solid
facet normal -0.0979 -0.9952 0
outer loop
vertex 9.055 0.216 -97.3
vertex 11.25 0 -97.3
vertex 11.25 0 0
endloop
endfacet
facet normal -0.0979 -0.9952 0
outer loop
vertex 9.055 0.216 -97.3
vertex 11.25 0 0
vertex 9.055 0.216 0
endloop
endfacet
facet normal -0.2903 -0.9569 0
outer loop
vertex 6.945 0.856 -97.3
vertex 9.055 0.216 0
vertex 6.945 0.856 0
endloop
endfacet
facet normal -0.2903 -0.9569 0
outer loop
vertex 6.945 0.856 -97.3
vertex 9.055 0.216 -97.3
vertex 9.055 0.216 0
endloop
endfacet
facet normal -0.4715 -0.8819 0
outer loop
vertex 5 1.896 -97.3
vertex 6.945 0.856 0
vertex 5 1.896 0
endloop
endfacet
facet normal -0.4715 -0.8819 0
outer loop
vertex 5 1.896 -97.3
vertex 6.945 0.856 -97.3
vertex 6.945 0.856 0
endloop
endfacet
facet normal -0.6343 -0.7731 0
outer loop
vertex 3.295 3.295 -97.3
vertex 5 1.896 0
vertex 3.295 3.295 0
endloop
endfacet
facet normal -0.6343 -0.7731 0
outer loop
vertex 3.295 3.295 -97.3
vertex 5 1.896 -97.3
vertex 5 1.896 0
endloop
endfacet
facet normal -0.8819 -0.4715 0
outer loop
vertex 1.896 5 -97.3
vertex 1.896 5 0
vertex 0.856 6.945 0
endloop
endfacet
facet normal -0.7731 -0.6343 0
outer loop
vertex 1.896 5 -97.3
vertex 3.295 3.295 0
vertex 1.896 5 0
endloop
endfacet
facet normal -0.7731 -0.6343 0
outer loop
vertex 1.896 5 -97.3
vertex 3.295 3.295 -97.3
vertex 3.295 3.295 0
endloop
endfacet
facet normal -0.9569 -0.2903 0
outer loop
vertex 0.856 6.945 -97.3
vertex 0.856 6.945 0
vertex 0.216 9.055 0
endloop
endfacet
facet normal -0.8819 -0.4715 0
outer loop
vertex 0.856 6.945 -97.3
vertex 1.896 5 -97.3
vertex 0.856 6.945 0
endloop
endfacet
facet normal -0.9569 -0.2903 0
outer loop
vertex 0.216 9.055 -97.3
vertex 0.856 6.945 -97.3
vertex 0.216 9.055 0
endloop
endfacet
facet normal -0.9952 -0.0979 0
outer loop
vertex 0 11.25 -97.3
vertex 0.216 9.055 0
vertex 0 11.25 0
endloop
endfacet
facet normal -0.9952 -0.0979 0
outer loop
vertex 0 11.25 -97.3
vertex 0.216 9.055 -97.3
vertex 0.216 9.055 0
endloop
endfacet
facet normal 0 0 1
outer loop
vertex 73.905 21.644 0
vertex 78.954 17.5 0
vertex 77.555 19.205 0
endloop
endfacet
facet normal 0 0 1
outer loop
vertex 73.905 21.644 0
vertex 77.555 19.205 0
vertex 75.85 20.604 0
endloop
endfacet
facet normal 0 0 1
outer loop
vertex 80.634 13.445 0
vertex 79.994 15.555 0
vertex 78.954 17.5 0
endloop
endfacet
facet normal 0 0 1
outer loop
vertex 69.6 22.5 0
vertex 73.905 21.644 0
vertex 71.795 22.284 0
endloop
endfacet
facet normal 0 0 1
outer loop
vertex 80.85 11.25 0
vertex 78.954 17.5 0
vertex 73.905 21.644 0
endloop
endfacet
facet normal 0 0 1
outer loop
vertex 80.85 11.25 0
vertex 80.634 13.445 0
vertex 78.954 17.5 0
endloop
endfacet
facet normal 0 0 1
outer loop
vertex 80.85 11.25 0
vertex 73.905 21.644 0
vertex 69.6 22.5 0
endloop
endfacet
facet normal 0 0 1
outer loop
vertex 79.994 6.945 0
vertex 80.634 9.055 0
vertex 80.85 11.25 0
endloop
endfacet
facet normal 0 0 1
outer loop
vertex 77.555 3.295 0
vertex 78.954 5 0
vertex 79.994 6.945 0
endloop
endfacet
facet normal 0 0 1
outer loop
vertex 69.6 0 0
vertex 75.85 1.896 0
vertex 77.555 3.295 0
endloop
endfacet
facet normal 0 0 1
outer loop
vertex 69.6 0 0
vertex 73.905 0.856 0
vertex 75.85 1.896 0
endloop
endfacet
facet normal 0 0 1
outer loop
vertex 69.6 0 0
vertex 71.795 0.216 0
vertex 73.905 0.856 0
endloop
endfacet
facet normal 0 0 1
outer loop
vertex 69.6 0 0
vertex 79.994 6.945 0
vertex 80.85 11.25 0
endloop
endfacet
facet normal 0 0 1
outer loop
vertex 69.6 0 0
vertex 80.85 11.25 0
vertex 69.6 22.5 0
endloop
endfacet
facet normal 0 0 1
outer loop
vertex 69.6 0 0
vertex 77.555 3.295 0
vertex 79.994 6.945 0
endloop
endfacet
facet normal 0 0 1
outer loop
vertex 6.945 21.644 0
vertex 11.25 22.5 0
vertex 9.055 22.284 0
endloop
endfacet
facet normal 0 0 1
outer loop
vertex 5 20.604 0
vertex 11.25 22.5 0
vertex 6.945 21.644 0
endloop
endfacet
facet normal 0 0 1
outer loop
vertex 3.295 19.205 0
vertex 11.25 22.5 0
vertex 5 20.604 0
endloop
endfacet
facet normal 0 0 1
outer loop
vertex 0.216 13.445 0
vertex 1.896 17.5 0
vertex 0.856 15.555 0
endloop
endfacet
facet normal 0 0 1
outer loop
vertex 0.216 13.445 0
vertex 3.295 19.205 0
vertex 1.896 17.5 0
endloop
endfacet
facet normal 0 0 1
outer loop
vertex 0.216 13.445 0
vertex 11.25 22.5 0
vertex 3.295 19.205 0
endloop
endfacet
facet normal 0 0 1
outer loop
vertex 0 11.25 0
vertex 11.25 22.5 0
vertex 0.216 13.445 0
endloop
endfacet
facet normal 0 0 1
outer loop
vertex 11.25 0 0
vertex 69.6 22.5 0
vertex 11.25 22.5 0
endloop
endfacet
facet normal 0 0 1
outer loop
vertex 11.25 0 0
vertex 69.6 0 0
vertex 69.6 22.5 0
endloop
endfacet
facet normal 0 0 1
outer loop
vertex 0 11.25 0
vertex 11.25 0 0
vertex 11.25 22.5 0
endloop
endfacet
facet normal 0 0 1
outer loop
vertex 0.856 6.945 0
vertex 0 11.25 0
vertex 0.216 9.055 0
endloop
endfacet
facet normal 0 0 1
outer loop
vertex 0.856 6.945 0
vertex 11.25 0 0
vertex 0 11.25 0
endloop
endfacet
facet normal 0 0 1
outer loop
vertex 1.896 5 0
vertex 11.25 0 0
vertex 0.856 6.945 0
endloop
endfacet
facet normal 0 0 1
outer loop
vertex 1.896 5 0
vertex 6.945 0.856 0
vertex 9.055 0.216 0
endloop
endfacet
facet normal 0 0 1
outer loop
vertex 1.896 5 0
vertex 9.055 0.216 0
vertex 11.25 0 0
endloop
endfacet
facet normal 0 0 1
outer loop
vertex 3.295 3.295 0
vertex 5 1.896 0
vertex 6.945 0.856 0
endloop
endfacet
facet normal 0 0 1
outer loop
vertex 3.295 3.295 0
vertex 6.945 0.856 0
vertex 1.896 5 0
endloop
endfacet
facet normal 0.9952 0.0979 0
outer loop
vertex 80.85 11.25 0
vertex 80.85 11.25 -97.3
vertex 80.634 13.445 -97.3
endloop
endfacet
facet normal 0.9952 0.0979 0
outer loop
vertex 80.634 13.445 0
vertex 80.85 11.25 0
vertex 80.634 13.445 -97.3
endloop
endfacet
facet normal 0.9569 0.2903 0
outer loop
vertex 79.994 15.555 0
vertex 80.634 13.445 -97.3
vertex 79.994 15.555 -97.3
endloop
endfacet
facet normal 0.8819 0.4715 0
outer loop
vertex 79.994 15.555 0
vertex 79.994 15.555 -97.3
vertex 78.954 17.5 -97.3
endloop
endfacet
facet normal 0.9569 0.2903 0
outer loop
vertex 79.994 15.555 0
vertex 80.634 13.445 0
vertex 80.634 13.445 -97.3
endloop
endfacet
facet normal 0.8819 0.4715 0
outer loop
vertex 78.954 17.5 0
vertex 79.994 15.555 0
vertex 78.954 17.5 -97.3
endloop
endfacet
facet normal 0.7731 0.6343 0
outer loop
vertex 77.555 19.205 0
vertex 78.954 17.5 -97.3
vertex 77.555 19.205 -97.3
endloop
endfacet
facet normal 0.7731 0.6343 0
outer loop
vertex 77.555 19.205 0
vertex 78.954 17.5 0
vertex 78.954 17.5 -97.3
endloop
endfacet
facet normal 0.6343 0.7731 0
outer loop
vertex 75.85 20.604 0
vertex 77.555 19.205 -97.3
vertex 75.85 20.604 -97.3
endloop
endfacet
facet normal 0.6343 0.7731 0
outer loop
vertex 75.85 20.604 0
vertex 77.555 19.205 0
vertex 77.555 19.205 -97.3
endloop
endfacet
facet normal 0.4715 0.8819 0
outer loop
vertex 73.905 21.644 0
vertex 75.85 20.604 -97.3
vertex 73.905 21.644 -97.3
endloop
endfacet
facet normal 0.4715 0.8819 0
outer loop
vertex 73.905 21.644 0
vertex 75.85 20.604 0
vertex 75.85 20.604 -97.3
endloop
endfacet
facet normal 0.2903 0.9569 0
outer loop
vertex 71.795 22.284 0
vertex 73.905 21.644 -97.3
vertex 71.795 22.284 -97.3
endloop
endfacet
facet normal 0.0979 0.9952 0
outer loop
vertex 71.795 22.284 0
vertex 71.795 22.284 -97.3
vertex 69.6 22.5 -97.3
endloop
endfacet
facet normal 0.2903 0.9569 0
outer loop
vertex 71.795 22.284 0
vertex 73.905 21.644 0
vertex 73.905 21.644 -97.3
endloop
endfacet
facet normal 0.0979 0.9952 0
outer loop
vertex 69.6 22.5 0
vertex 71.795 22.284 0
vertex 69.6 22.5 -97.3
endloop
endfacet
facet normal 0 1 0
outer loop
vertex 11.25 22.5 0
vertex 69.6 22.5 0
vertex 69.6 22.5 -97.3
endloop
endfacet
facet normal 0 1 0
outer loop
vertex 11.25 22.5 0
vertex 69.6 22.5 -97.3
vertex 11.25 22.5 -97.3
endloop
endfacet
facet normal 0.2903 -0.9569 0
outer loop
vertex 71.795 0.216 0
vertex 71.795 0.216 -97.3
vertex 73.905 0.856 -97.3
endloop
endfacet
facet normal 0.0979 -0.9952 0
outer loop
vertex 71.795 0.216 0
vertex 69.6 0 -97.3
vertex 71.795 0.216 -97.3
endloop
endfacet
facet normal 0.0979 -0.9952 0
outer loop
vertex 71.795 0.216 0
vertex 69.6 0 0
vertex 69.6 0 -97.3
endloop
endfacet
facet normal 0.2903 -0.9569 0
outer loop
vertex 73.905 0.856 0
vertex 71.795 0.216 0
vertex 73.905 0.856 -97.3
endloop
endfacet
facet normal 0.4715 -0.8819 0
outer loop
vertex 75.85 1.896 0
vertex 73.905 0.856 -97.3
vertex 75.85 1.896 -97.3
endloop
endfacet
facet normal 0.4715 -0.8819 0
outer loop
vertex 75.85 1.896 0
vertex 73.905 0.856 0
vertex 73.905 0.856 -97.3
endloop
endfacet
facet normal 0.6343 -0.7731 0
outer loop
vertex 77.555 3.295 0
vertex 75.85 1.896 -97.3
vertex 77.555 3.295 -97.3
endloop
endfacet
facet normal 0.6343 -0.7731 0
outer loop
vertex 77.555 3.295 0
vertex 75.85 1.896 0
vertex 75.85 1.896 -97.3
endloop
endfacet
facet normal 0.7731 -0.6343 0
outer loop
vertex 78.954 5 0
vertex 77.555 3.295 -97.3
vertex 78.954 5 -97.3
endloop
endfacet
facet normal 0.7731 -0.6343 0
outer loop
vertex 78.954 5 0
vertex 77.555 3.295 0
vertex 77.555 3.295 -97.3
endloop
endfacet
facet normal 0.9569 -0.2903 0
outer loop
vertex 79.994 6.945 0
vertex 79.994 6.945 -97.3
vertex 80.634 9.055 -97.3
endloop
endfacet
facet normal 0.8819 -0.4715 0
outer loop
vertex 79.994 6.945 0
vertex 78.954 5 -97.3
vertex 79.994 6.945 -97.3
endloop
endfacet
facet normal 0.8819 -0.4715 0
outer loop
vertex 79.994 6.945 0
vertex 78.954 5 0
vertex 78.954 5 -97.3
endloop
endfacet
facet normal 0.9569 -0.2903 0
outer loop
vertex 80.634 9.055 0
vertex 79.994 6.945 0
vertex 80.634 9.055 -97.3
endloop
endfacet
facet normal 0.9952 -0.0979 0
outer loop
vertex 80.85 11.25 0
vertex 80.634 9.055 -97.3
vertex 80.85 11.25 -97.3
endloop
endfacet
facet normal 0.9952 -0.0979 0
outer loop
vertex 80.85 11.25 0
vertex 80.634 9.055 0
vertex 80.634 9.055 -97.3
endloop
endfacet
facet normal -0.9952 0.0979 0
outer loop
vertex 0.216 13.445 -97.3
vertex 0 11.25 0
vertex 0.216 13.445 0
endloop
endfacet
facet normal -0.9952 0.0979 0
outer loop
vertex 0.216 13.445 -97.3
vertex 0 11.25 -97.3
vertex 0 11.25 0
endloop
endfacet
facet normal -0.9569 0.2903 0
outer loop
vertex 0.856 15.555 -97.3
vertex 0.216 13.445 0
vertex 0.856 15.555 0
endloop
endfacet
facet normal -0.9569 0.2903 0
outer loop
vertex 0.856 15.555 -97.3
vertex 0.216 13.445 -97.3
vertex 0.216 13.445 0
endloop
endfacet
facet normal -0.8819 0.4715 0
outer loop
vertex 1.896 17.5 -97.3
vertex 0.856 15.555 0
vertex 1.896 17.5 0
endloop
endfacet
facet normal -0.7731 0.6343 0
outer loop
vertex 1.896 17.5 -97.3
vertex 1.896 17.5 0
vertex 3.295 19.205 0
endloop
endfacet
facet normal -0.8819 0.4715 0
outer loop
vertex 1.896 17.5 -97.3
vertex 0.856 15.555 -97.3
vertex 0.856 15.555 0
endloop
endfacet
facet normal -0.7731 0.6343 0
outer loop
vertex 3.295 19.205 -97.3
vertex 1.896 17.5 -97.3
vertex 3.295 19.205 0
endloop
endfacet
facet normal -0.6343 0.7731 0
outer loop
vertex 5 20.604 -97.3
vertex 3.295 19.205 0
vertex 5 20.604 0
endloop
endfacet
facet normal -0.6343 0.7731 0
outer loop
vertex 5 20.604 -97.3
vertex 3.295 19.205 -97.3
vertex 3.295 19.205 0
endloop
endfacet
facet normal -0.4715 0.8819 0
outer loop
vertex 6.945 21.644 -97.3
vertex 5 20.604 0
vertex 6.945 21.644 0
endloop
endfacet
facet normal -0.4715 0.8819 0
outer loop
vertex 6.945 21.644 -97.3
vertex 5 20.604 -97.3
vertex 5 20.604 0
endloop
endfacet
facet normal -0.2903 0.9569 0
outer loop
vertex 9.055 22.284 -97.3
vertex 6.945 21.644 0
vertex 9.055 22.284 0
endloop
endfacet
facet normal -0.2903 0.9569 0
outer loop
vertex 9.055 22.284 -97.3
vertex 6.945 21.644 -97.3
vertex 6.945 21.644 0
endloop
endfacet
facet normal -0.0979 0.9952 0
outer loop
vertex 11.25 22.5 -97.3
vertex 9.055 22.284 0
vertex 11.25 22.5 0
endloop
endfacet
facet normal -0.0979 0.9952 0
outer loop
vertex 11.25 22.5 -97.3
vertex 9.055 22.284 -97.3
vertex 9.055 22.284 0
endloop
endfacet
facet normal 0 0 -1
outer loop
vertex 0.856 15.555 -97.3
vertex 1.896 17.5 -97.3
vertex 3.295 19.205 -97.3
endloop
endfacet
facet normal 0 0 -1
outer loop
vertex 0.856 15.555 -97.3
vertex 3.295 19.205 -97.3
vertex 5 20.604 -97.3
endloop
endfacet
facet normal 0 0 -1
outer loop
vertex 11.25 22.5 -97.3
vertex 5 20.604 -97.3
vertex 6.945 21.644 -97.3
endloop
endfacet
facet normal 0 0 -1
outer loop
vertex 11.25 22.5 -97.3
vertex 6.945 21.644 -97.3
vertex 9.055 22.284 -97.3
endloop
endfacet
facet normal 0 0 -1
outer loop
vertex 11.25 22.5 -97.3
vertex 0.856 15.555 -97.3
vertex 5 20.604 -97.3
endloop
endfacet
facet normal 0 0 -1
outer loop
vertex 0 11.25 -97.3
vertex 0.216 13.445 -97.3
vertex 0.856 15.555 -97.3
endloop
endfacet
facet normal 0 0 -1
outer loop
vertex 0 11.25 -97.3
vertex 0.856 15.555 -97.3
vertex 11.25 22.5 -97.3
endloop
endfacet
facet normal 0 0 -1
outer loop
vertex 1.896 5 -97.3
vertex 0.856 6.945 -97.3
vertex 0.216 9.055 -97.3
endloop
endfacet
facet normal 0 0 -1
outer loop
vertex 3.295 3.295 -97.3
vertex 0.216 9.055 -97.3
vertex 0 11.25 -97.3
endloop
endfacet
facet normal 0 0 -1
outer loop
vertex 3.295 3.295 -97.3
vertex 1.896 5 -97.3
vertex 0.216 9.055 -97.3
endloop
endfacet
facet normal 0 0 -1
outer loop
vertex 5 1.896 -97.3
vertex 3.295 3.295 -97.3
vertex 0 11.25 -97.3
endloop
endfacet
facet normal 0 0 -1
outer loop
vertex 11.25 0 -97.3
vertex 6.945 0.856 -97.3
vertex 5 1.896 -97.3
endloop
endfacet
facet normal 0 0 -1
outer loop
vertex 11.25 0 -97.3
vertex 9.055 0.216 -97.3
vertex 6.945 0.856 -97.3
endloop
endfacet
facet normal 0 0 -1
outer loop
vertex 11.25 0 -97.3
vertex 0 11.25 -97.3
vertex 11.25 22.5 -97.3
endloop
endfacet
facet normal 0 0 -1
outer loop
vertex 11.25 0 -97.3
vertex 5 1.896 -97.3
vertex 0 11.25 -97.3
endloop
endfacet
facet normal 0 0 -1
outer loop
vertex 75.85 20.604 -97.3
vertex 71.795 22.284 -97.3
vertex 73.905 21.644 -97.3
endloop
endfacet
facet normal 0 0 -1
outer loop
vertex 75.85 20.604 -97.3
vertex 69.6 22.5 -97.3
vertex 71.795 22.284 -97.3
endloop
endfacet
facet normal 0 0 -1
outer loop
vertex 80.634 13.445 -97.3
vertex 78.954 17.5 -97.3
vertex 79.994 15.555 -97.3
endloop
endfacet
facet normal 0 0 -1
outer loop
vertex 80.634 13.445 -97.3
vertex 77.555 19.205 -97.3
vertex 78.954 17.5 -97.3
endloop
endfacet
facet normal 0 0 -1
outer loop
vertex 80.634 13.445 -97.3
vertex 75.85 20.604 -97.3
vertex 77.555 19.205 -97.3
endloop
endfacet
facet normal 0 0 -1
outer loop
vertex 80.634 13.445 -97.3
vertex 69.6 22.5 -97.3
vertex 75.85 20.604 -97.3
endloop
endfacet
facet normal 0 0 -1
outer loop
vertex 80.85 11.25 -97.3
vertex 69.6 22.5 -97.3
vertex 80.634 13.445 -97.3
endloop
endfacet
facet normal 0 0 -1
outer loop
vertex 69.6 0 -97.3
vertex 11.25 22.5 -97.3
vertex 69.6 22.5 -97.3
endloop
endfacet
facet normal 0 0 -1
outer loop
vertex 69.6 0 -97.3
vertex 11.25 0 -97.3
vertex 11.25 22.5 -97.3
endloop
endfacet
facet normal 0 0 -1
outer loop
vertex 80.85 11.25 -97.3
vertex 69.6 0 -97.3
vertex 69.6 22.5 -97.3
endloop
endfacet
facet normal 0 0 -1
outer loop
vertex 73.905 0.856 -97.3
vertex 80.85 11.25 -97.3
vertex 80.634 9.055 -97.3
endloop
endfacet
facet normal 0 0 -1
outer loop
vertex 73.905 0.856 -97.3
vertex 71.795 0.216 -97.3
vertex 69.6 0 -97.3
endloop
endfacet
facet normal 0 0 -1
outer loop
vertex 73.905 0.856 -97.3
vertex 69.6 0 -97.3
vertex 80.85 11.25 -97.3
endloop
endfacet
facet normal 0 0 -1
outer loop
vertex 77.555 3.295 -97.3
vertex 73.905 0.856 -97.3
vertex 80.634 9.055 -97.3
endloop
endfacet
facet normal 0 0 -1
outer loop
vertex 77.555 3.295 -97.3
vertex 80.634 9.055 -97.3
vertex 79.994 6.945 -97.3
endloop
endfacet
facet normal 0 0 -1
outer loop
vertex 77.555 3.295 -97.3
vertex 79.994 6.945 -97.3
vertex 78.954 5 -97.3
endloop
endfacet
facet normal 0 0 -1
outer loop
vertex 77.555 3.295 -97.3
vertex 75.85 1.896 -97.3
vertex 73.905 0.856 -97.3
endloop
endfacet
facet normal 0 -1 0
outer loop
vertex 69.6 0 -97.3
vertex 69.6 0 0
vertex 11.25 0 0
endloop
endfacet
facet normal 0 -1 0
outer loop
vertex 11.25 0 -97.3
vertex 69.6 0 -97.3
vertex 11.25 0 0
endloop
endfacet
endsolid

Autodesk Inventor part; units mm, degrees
ref_plane "YZ Plane" through (0, 0, 0) normal (1, 0, 0) x (0, 1, 0)
ref_plane "XZ Plane" through (0, 0, 0) normal (0, 1, 0) x (-1, 0, 0)
ref_plane "XY Plane" through (0, 0, 0) normal (0, 0, 1) x (1, 0, 0)
sketch "Sketch1" plane through (0, 0, 0) normal (0, 1, 0) x (-1, 0, 0)
  line L0 (0, 0) -> (0, -97.3)
  line L1 (0, -97.3) -> (-80.85, -97.3)
  line L2 (-80.85, -97.3) -> (-80.85, 0)
  line L3 (-80.85, 0) -> (0, 0)
  dimension "d0" = 97.3
  dimension "d1" = 80.85
extrude "Extrusion1" add sketch "Sketch1" along normal blind 22.5
fillet "Fillet2" radius 11.25 4 edges at (80.85, 22.5, -48.65) (0, 22.5, -48.65) (80.85, 0, -48.65) (0, 0, -48.65)
properties part number "anker_battery_pack"
